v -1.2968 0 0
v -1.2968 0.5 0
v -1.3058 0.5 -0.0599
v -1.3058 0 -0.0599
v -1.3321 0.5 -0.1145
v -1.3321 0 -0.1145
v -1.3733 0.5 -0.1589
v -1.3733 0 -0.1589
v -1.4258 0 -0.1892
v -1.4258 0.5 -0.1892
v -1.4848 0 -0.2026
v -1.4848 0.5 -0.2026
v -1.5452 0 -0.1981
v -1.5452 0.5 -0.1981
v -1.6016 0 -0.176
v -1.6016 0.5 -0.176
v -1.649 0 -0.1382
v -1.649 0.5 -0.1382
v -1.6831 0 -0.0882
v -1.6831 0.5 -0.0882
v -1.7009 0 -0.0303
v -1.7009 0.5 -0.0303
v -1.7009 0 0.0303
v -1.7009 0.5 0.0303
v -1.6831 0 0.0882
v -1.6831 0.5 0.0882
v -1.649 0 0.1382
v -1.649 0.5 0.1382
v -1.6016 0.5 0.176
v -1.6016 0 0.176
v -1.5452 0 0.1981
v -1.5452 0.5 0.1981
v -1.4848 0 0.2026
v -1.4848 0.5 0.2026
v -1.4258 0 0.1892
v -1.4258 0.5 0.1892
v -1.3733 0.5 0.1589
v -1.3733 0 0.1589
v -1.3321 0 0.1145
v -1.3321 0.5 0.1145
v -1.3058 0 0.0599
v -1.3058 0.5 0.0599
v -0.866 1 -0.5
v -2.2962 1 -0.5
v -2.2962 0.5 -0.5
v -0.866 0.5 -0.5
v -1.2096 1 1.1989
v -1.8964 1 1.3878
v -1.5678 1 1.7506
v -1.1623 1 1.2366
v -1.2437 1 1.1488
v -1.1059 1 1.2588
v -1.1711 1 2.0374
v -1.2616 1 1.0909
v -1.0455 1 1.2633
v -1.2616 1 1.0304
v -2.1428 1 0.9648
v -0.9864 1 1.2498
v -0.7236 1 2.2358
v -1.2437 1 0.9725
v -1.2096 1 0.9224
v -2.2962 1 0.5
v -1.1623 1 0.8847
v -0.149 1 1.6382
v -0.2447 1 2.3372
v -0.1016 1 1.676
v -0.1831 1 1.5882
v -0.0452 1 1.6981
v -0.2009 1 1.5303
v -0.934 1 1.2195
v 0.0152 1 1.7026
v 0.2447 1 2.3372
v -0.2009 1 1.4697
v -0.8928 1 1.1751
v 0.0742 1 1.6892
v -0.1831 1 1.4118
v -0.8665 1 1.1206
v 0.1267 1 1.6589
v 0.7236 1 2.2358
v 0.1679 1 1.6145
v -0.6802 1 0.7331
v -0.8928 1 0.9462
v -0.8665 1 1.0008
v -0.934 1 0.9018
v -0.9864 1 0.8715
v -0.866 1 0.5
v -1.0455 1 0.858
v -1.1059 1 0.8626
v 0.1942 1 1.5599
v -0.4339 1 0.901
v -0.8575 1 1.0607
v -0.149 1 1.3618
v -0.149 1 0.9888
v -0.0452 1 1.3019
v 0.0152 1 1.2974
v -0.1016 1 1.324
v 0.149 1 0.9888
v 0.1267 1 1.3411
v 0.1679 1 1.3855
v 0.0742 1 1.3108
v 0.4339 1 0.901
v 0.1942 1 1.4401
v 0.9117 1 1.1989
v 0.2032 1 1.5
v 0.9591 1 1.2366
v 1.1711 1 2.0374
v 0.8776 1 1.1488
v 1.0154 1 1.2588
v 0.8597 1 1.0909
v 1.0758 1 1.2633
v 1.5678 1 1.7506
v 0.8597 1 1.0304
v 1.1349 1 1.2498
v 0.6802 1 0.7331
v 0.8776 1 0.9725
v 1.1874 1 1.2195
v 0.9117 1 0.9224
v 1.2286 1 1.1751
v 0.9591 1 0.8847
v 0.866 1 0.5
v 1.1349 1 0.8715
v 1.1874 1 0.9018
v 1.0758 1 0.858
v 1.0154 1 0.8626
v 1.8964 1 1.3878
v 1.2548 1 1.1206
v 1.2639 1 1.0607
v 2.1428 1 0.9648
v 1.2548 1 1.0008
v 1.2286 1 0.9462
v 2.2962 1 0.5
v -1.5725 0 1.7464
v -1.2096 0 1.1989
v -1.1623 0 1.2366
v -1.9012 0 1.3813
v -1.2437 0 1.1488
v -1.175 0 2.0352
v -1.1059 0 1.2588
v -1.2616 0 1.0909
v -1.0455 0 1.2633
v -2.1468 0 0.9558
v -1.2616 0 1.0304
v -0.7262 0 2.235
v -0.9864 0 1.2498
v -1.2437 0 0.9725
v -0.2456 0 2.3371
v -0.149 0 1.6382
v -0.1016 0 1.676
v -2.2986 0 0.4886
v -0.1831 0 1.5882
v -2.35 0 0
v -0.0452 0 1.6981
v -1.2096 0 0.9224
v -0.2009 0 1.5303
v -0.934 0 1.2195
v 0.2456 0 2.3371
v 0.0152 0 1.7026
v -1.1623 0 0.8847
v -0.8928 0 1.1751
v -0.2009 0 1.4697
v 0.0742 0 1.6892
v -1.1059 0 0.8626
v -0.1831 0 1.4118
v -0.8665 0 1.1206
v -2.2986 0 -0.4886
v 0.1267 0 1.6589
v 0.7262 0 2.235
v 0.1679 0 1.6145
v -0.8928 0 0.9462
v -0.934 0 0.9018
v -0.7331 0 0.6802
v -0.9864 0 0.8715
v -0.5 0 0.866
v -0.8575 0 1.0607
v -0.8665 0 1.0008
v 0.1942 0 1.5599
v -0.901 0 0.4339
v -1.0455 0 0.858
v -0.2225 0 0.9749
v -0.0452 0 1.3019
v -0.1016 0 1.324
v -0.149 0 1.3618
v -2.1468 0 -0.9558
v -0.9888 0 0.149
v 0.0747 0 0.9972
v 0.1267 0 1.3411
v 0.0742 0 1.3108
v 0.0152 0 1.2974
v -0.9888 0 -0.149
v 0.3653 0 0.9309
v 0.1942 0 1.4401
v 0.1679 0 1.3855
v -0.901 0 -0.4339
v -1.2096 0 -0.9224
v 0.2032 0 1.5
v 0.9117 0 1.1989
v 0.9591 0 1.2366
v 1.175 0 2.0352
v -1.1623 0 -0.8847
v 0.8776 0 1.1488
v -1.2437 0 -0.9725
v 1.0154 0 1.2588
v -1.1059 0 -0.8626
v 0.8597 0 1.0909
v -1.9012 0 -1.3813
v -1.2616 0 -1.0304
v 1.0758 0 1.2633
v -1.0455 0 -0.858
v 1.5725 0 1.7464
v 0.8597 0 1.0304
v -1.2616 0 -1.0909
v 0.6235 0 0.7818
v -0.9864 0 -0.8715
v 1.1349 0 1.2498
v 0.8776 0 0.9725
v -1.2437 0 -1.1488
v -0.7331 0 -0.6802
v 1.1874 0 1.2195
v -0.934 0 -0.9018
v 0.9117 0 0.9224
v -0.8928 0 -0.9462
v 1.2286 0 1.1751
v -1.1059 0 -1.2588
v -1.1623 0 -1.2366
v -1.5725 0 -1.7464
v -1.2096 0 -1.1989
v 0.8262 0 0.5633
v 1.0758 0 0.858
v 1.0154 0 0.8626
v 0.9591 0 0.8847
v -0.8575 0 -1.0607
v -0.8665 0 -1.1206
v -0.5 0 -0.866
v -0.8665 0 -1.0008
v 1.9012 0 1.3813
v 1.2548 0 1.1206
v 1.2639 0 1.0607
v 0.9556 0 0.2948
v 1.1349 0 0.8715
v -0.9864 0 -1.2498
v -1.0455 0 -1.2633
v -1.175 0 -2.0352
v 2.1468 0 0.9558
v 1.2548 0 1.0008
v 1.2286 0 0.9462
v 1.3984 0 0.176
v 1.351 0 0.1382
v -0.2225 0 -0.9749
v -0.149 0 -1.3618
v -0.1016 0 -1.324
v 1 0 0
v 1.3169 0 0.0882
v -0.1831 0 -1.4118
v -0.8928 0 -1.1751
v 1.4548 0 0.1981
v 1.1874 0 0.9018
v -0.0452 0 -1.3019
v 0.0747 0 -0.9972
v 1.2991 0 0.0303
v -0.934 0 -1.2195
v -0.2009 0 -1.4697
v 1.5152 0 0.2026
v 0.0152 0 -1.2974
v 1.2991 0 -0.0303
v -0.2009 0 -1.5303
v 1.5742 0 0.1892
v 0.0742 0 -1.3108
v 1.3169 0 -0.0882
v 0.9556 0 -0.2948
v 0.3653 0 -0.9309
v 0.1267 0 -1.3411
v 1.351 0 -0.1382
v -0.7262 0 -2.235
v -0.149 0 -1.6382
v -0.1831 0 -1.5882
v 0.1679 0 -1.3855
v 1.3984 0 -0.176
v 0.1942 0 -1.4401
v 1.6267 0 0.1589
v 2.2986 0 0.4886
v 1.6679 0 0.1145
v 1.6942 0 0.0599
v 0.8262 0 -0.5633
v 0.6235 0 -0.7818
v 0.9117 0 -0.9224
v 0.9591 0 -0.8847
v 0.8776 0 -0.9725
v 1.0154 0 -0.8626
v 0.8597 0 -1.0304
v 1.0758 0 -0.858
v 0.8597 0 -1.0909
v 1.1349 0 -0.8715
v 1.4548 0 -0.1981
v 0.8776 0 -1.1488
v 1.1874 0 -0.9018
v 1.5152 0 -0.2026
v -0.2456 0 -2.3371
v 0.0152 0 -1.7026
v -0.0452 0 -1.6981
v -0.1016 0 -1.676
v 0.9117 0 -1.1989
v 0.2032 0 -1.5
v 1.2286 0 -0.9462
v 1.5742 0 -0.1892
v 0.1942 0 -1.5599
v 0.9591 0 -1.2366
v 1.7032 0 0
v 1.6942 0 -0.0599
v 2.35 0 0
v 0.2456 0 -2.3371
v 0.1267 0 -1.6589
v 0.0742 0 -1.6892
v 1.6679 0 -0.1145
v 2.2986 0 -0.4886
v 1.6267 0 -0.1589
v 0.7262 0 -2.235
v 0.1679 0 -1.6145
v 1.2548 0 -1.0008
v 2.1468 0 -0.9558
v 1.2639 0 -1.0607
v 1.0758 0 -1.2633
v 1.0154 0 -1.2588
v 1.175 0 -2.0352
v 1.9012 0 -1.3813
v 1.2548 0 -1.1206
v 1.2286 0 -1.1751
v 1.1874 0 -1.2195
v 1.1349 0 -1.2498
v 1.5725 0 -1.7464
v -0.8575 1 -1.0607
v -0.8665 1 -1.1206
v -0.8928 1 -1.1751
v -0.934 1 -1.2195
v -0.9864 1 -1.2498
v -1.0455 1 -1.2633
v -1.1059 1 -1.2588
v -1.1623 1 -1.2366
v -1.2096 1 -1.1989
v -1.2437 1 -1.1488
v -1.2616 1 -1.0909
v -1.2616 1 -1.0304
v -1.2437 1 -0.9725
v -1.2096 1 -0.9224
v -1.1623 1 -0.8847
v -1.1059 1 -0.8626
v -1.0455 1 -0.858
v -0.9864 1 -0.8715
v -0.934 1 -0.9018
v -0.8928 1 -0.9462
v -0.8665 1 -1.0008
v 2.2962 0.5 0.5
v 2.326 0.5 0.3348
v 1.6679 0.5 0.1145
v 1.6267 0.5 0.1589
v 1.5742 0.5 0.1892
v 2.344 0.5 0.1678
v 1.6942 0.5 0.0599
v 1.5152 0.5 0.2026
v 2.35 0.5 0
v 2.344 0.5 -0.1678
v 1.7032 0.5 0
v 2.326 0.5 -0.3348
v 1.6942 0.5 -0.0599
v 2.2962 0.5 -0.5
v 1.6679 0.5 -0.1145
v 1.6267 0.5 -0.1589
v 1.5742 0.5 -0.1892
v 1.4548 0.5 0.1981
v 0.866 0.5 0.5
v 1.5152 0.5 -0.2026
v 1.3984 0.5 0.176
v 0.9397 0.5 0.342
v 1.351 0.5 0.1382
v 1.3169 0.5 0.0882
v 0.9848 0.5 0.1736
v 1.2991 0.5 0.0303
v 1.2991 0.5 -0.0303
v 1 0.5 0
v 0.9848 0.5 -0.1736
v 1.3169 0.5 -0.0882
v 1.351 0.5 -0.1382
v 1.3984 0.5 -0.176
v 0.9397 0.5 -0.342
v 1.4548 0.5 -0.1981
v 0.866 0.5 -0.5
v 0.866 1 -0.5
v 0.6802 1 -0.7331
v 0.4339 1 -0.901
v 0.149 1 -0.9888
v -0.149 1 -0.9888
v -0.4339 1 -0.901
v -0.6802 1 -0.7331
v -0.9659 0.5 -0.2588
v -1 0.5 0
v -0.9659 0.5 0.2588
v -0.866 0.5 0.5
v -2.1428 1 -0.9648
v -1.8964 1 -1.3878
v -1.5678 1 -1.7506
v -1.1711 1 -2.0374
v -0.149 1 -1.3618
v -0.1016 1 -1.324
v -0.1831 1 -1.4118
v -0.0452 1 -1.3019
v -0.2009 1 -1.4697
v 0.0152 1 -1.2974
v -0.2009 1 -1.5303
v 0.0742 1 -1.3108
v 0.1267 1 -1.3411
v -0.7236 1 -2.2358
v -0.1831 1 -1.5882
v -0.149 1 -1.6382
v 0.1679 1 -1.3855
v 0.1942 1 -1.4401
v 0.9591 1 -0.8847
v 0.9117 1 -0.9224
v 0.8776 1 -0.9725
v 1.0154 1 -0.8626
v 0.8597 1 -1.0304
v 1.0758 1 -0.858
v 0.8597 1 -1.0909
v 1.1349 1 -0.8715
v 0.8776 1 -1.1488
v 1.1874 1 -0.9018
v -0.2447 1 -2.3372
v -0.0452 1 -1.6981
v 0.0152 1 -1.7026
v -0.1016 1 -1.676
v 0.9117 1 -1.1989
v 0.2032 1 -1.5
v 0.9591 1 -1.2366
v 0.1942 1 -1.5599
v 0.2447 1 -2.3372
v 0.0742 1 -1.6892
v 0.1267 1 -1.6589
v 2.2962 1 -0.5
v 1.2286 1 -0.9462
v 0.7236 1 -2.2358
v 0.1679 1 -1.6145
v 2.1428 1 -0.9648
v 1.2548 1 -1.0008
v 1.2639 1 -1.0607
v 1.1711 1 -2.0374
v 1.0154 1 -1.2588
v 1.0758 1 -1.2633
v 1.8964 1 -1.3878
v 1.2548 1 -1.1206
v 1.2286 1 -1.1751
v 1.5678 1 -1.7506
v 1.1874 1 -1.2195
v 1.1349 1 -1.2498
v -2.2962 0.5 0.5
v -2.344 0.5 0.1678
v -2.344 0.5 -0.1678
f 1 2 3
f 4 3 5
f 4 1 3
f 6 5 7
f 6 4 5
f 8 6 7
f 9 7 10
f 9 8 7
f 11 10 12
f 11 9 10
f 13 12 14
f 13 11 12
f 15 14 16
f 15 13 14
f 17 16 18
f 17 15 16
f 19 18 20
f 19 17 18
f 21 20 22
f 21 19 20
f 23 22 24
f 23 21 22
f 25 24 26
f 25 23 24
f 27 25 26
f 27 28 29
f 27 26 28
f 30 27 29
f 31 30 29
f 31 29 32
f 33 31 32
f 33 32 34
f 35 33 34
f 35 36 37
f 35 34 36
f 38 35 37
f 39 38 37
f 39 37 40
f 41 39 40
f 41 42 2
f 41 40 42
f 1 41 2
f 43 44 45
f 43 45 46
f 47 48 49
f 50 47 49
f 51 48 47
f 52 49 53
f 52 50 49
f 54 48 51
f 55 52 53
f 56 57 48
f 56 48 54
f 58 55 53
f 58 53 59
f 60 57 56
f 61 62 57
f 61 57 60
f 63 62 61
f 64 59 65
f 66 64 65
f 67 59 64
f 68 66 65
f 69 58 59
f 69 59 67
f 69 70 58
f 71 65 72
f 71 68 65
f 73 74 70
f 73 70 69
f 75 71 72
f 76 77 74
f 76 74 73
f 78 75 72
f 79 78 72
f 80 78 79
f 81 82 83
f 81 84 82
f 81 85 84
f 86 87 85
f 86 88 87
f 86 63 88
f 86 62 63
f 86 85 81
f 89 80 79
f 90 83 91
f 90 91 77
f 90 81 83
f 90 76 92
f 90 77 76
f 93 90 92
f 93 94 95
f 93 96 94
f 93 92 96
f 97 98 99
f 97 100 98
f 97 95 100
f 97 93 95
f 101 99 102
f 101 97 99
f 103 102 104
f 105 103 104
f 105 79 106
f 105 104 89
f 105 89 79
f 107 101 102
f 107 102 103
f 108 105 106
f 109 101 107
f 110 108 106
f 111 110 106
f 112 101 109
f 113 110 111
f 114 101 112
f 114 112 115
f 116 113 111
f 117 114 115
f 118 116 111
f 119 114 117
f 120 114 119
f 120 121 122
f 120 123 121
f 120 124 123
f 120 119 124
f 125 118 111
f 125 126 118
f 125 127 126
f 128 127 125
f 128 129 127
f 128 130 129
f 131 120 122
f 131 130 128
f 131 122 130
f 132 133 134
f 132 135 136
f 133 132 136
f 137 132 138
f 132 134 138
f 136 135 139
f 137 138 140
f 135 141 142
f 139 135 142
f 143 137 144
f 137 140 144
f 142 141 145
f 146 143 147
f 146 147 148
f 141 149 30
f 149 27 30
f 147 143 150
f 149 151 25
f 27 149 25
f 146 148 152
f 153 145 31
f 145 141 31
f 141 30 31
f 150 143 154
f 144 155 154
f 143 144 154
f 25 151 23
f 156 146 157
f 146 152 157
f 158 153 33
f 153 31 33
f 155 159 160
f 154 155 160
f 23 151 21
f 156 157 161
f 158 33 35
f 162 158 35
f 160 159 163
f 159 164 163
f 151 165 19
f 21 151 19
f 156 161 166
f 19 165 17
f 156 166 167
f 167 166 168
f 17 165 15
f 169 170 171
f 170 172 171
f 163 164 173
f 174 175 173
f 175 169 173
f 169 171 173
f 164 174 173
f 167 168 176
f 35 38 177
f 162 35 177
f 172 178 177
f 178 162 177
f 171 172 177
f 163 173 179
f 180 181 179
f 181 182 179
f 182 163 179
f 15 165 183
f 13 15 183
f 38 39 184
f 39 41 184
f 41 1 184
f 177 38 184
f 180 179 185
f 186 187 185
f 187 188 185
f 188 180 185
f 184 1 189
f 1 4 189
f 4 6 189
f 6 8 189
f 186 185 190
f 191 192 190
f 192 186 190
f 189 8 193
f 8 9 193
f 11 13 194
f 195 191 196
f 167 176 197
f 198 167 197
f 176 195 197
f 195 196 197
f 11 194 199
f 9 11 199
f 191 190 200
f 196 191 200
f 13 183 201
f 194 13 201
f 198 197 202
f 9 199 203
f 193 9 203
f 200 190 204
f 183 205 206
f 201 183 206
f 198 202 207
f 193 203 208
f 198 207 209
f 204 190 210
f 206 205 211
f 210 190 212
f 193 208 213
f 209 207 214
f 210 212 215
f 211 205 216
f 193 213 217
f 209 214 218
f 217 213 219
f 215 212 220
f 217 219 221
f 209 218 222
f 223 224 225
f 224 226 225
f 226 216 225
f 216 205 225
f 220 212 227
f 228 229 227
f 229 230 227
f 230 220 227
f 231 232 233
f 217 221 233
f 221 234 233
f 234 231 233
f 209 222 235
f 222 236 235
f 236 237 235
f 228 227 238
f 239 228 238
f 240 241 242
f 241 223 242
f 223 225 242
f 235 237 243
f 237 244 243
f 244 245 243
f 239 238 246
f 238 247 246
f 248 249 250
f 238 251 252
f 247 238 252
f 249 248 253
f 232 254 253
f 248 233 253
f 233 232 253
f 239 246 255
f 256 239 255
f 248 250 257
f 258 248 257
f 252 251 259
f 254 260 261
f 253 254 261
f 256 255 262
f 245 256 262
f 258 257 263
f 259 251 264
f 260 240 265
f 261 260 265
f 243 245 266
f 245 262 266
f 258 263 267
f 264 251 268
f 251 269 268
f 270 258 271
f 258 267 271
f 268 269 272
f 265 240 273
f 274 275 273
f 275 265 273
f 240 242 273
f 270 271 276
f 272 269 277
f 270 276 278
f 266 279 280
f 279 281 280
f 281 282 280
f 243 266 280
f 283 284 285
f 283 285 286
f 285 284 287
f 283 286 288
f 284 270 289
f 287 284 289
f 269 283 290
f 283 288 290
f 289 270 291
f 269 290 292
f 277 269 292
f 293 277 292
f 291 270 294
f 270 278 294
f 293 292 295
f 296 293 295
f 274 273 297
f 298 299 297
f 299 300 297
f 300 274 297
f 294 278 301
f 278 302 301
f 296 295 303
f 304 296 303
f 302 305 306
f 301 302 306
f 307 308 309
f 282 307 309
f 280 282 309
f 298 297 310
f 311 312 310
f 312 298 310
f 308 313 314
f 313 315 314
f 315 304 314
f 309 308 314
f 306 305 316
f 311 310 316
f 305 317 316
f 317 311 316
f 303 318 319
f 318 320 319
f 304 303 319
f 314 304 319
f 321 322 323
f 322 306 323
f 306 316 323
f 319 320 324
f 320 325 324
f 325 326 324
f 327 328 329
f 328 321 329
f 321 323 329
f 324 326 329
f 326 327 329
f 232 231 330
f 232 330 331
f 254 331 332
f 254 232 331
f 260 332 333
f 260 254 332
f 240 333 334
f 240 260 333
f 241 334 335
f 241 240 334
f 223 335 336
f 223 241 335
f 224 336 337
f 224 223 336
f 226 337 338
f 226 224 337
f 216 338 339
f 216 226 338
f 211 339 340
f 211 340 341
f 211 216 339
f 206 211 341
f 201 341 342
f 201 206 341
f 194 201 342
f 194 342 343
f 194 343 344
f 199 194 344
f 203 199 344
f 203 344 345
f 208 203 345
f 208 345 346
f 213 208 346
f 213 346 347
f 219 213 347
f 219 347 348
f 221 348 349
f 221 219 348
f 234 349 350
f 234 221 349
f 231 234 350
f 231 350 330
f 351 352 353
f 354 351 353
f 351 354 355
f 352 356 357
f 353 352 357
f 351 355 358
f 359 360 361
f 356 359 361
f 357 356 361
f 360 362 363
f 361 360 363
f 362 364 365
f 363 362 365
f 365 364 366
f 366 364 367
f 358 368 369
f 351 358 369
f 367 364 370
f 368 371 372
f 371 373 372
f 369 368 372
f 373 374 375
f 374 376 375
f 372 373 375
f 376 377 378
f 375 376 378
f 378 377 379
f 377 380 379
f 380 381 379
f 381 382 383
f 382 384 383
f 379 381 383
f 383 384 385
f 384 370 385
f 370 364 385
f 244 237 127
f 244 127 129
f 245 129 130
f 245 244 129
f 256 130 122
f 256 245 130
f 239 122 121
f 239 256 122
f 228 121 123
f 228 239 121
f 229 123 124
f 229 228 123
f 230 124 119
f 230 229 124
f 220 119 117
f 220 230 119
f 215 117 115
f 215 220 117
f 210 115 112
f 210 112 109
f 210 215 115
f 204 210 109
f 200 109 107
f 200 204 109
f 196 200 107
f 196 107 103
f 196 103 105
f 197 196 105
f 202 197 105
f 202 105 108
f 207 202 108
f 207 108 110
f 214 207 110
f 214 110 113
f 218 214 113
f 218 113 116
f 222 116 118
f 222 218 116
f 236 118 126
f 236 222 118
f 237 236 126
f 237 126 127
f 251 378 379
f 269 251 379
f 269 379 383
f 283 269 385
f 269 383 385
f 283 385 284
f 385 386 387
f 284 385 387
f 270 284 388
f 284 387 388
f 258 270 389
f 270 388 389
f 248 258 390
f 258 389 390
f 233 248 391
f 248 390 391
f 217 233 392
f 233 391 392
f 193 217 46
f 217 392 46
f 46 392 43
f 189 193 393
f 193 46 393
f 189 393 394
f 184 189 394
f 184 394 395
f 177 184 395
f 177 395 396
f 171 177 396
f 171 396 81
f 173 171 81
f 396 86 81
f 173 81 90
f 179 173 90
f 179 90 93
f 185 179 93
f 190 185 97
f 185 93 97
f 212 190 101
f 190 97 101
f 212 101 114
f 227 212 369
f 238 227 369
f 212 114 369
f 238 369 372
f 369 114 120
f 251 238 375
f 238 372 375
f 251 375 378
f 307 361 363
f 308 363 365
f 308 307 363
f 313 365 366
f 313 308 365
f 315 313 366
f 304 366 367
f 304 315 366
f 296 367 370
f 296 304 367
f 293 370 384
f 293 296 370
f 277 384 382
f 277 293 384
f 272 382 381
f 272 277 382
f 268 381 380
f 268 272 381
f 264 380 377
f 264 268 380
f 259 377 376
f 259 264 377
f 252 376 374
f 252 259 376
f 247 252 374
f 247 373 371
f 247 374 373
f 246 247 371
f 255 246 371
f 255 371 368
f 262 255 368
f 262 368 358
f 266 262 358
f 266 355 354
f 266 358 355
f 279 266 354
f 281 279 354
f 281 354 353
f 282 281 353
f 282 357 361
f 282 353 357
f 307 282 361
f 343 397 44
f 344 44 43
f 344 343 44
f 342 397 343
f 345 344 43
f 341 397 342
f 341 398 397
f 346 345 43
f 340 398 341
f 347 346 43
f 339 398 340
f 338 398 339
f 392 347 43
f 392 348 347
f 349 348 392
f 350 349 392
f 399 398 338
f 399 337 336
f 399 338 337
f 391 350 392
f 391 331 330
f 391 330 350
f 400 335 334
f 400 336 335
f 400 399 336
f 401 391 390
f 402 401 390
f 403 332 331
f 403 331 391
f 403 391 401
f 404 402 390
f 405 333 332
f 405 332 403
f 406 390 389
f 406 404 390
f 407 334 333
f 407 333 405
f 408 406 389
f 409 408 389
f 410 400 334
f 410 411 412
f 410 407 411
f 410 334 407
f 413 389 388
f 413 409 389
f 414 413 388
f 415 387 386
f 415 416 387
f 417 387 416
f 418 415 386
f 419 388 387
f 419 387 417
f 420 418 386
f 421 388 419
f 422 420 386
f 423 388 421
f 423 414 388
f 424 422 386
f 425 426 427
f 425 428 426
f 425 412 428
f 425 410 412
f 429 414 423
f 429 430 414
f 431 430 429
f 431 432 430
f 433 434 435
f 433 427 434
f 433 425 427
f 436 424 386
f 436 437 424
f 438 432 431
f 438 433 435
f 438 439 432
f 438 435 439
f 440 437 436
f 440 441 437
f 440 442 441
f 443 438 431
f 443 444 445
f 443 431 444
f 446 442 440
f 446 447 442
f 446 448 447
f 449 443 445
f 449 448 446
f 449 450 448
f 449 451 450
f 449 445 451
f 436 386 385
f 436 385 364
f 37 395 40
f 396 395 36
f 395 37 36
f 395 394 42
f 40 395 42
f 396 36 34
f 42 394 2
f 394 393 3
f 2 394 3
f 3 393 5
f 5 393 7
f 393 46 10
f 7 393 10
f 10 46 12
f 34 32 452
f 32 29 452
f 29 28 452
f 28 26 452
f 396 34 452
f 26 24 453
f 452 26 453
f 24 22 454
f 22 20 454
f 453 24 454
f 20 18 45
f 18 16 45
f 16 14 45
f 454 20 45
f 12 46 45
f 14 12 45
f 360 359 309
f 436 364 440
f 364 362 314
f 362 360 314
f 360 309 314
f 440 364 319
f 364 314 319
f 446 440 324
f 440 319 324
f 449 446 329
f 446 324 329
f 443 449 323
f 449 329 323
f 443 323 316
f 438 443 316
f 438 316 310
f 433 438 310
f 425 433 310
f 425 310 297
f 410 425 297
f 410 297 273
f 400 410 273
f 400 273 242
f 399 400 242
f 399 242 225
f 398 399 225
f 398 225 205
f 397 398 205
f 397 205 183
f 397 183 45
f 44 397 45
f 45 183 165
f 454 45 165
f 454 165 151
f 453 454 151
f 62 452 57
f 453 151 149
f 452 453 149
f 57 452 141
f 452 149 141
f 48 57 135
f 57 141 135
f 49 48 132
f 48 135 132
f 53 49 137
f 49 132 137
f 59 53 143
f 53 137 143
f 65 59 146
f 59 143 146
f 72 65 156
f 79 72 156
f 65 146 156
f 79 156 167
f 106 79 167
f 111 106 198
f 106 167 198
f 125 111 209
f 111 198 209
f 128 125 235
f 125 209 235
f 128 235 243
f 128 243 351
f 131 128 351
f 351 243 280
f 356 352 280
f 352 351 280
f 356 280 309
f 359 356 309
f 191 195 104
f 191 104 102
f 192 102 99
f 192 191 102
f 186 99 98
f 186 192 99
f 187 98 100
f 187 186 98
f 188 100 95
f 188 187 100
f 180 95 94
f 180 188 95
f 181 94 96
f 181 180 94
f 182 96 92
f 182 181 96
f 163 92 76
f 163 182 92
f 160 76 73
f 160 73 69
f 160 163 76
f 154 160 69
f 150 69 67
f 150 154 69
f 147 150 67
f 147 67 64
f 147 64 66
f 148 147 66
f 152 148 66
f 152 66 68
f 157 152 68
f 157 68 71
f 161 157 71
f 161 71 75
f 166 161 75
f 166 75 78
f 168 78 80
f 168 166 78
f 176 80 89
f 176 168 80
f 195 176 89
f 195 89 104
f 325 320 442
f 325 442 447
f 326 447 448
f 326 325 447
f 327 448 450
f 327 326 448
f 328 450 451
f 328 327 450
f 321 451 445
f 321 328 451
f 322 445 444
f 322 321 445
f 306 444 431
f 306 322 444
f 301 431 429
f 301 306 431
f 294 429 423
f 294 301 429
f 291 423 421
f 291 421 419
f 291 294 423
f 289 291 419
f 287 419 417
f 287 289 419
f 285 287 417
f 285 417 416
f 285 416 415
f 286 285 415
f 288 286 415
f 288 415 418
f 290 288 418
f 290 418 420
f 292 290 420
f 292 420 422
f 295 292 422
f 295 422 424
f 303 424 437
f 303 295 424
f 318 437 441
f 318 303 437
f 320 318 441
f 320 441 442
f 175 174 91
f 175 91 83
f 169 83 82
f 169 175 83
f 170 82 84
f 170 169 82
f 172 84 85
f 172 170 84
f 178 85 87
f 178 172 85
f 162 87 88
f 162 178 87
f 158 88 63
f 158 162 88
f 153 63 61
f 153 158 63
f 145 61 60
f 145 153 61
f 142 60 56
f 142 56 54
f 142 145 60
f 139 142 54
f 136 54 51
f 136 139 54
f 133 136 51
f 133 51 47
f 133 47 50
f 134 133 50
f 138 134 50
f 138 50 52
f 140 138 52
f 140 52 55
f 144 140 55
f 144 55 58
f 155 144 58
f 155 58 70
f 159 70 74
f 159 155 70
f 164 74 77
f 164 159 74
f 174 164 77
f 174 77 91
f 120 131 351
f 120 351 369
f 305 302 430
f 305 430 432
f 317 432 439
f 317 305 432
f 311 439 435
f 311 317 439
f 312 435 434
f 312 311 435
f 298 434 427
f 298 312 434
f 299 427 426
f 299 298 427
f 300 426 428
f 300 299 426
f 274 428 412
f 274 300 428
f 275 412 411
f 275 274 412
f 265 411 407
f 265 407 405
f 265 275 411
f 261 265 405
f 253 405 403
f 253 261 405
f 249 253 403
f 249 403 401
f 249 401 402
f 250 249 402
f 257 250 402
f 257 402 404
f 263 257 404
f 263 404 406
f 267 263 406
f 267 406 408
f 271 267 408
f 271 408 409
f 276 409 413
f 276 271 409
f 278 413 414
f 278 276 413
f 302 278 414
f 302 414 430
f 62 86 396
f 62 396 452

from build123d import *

# Parameters (mm, degrees)
SKETCH1_R           = 2.35
SKETCH1_R_2         = 0.2032
BOSS_EXTRUDE1_DEPTH = 1
SKETCH3_R           = 1
CUT_EXTRUDE1_DEPTH  = 2
CUT_EXTRUDE2_DEPTH  = 0.5


with BuildPart() as part:
    # Sketch1 → Boss-Extrude1 (new body)
    with BuildSketch(Plane(origin=(0, 0, 0), x_dir=(1, 0, 0), z_dir=(0, 1, 0))):
        Circle(SKETCH1_R)
        with Locations((0, 1.5)):
            Circle(SKETCH1_R_2, mode=Mode.SUBTRACT)
        with Locations((1.060660172, 1.060660172)):
            Circle(SKETCH1_R_2, mode=Mode.SUBTRACT)
        with Locations((1.5, 0)):
            Circle(SKETCH1_R_2, mode=Mode.SUBTRACT)
        with Locations((1.060660172, -1.060660172)):
            Circle(SKETCH1_R_2, mode=Mode.SUBTRACT)
        with Locations((0, -1.5)):
            Circle(SKETCH1_R_2, mode=Mode.SUBTRACT)
        with Locations((-1.060660172, -1.060660172)):
            Circle(SKETCH1_R_2, mode=Mode.SUBTRACT)
        with Locations((-1.5, 0)):
            Circle(SKETCH1_R_2, mode=Mode.SUBTRACT)
        with Locations((-1.060660172, 1.060660172)):
            Circle(SKETCH1_R_2, mode=Mode.SUBTRACT)
    extrude(amount=BOSS_EXTRUDE1_DEPTH)

    # Sketch3 → Cut-Extrude1 (cut, through all)
    with BuildSketch(Plane(origin=(0, 1, 0), x_dir=(1, 0, 0), z_dir=(0, 1, 0))):
        Circle(SKETCH3_R)
    extrude(amount=-CUT_EXTRUDE1_DEPTH, mode=Mode.SUBTRACT)

    # Sketch4 → Cut-Extrude2 (cut)
    with BuildSketch(Plane(origin=(0, 1, 0), x_dir=(1, 0, 0), z_dir=(0, 1, 0))):
        with BuildLine():
            Line((-2.35, 0.5), (2.35, 0.5))
            ThreePointArc((2.35, 0.5), (2.85, 0), (2.35, -0.5))
            Line((2.35, -0.5), (-2.35, -0.5))
            ThreePointArc((-2.35, -0.5), (-2.85, 0), (-2.35, 0.5))
        make_face()
    extrude(amount=-CUT_EXTRUDE2_DEPTH, mode=Mode.SUBTRACT)


solid = part.part
